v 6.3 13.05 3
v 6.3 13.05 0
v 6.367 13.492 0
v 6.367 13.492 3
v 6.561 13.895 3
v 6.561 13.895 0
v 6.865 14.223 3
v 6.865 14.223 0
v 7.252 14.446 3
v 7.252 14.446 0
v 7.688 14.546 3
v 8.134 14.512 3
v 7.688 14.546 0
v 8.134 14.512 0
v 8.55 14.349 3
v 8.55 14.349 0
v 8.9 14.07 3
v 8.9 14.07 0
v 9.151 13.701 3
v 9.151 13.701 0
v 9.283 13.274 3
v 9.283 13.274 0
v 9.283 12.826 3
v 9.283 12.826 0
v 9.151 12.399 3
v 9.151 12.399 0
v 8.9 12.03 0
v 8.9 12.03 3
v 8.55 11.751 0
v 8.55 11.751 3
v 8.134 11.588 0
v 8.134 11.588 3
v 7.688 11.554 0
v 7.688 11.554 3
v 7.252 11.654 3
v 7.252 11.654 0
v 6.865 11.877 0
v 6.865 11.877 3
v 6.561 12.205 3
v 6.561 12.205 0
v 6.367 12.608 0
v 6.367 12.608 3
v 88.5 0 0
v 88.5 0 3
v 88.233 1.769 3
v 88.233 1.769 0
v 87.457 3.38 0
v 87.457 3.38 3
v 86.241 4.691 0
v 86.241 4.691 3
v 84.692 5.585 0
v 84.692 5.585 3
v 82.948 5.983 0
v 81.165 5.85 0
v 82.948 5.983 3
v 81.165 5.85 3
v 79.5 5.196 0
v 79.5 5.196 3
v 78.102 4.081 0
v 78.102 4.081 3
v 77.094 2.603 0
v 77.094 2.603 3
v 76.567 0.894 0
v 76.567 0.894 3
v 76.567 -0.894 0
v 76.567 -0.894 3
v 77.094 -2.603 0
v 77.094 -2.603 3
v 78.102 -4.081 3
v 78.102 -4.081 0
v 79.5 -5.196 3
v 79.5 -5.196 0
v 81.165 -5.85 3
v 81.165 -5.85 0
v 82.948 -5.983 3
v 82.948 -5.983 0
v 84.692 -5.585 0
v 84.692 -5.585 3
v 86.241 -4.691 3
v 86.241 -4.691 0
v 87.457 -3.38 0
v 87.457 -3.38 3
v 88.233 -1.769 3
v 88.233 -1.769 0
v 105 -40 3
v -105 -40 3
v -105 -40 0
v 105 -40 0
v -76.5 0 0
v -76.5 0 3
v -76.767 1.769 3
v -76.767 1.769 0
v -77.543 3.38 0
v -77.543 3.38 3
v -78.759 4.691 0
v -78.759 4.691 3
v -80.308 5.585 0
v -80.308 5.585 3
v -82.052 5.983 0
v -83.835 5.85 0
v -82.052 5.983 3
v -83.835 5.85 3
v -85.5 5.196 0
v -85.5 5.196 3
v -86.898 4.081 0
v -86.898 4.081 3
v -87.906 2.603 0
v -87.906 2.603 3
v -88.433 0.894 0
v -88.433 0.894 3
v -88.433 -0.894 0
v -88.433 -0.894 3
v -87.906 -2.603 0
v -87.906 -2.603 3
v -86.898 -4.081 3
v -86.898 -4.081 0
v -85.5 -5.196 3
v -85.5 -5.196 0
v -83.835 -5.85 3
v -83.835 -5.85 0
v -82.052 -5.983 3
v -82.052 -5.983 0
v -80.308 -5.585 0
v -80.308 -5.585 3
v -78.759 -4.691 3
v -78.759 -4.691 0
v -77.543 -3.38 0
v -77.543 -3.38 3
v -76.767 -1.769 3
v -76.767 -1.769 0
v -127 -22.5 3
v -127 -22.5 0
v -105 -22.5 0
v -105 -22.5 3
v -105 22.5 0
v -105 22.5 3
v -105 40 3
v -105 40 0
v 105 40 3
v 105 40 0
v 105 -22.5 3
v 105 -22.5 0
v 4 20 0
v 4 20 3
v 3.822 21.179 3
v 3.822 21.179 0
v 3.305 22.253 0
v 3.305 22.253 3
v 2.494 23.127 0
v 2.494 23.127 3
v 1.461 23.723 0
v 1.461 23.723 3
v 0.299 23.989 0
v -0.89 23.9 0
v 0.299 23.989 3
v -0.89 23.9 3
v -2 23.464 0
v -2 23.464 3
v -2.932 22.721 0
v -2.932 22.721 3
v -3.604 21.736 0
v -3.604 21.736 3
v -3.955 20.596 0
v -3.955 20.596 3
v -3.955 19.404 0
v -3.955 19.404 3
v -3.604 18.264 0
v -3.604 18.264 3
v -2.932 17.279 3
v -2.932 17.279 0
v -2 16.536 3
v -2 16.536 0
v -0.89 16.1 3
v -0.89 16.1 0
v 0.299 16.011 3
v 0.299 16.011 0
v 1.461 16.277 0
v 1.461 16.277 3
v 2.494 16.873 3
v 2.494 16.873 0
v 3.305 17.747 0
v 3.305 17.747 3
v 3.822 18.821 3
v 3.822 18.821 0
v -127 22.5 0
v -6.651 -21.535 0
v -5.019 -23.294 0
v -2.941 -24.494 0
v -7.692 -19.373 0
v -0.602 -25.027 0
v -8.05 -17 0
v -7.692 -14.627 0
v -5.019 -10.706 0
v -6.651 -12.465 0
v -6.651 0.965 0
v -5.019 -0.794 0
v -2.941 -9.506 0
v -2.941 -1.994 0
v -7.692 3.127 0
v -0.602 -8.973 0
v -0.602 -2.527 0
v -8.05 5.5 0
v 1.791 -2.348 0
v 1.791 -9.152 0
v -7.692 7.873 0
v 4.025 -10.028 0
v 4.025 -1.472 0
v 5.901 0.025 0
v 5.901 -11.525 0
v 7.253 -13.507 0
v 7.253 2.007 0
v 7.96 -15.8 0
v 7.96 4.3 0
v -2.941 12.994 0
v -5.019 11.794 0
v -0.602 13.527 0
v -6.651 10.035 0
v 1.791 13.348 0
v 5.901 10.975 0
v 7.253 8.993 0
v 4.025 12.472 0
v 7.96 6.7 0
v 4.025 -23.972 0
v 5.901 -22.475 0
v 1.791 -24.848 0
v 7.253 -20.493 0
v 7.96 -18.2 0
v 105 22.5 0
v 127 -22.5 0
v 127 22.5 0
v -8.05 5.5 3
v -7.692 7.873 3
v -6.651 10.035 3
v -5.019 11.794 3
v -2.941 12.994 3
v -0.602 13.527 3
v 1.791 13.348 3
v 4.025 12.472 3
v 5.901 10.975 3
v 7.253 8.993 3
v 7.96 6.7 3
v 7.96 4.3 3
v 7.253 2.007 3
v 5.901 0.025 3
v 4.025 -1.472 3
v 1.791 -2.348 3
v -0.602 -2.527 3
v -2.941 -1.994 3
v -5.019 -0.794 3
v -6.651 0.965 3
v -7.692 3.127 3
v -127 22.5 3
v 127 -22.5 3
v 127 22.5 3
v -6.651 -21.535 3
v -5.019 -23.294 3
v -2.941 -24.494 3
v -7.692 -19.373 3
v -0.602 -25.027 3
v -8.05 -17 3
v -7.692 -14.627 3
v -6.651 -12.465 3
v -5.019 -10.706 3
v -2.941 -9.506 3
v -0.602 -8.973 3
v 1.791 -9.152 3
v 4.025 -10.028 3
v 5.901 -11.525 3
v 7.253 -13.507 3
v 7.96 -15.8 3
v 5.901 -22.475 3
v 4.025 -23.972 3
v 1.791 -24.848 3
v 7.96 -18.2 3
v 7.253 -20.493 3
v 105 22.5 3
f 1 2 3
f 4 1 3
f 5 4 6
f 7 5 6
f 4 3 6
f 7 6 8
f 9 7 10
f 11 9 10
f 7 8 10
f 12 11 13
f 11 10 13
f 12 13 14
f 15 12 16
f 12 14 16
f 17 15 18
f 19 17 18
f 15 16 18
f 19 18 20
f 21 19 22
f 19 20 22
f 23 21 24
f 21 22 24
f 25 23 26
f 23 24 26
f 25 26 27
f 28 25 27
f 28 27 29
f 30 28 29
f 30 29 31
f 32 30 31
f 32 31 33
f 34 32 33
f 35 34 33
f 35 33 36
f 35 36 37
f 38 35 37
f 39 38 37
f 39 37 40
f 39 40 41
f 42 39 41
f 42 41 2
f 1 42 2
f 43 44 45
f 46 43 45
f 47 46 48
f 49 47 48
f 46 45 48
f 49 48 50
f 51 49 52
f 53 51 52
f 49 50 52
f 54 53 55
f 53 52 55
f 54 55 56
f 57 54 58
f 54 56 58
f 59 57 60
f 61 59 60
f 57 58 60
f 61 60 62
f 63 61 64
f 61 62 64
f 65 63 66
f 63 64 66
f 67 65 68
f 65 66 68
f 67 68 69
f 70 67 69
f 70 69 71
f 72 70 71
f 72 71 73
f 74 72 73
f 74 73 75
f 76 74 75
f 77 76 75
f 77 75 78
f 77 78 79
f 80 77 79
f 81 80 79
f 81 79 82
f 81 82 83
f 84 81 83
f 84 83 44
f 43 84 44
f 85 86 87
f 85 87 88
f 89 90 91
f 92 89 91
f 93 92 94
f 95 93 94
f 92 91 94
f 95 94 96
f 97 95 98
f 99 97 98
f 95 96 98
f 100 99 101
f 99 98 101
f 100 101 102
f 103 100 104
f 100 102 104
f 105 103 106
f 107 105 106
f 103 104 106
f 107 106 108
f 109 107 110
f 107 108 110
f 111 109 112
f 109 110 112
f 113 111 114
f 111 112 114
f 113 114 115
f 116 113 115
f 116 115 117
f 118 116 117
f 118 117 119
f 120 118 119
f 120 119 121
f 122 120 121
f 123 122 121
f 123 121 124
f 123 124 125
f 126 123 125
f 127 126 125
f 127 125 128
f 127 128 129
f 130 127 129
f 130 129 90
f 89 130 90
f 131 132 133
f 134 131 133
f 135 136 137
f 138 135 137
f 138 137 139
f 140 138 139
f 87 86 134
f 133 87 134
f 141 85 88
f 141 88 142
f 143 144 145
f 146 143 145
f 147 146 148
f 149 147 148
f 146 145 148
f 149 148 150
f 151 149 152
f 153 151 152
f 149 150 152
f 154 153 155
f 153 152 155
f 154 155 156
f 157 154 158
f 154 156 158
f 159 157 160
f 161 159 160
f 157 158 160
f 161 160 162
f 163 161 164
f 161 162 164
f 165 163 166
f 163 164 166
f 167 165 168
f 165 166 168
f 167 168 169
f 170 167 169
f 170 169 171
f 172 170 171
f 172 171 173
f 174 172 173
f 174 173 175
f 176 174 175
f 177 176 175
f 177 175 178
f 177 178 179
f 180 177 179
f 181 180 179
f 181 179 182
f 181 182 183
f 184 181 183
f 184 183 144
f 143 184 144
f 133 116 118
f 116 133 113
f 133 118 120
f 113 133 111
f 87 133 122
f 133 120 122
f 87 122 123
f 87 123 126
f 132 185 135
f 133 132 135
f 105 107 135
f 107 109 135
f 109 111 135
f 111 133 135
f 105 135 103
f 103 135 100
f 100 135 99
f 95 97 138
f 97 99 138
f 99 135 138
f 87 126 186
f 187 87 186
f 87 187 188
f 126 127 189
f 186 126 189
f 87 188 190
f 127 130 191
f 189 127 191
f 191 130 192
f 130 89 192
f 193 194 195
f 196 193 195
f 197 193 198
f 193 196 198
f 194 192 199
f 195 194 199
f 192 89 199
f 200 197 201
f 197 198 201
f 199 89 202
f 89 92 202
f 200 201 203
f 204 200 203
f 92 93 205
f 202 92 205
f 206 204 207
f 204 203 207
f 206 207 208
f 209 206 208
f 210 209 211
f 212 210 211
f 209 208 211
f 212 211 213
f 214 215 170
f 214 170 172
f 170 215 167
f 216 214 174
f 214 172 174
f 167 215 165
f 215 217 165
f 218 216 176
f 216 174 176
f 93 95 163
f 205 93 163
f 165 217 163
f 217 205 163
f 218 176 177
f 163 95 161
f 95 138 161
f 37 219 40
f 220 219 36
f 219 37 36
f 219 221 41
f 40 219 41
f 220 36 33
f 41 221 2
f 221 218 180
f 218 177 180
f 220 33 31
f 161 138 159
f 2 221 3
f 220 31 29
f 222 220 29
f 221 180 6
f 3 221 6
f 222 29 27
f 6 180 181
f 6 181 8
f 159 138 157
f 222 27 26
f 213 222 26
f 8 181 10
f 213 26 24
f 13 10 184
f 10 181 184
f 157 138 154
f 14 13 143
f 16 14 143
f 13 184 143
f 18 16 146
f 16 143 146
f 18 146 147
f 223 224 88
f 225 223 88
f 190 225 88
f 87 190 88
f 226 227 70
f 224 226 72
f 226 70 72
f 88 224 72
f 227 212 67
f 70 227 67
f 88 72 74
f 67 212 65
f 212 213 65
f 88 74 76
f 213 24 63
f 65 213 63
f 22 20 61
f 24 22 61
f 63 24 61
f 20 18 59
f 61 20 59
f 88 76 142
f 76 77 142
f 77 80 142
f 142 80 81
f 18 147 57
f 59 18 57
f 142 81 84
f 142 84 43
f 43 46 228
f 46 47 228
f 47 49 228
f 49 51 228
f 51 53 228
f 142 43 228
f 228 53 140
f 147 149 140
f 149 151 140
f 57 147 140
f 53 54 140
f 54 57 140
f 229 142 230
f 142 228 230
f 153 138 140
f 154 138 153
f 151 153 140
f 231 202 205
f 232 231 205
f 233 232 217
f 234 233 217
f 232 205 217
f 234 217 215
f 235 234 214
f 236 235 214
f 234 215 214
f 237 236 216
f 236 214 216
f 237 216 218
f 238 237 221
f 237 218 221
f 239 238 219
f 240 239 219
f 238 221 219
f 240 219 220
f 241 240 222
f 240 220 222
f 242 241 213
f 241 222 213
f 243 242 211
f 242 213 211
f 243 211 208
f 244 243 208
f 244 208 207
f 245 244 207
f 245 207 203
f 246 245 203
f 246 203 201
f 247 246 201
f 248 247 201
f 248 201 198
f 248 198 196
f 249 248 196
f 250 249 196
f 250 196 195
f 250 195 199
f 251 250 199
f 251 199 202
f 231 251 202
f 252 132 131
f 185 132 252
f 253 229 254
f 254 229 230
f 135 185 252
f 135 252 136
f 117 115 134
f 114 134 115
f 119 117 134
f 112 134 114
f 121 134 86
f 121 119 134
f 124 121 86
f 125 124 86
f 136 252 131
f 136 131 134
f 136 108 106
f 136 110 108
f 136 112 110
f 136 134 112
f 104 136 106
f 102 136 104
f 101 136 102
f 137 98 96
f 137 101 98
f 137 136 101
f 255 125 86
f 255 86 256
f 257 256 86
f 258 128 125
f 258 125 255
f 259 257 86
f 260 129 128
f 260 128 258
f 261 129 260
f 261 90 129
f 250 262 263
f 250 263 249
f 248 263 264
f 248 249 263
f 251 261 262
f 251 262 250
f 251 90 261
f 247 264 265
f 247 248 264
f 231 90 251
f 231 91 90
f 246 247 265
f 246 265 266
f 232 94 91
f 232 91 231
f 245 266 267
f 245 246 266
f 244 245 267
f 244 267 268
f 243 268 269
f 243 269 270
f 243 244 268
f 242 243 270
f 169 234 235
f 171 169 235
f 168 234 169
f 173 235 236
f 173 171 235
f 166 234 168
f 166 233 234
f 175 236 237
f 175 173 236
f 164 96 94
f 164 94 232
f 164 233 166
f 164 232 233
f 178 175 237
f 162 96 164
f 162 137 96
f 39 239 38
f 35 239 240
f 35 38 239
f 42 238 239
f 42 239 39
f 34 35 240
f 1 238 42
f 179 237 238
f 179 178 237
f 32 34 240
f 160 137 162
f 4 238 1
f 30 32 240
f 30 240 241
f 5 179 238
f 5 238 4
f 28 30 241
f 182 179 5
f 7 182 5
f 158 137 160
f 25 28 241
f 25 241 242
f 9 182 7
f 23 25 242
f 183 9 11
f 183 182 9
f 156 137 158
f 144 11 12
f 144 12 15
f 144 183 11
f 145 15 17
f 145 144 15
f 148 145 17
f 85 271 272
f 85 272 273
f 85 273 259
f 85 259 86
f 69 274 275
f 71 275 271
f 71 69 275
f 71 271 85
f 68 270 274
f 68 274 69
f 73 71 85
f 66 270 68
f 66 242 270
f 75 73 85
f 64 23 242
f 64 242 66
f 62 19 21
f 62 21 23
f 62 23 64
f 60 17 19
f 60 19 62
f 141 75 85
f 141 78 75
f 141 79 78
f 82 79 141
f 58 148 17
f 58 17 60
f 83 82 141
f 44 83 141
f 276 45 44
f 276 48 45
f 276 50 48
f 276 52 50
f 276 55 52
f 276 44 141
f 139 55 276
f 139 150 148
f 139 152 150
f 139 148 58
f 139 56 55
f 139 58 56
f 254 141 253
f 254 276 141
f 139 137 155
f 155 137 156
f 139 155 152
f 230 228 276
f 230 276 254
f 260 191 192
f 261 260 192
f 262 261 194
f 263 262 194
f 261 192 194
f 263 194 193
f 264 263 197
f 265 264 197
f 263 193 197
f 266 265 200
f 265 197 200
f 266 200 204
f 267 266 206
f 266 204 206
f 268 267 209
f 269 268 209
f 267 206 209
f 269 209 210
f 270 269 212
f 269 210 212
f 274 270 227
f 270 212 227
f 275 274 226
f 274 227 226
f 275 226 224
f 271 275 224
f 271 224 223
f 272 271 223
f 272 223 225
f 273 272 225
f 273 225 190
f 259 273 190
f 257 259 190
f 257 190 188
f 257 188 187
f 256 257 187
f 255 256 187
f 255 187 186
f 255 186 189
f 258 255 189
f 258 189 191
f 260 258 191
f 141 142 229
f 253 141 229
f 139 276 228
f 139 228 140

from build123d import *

# Parameters (mm, degrees)
CROQUIS1_W              = 22
CROQUIS1_H              = 45
CROQUIS1_W_2            = 210
CROQUIS1_H_2            = 60
SALIENTE_EXTRUIR1_DEPTH = 3
CORTAR_EXTRUIR1_REACH   = 5
CROQUIS2_R              = 6
CORTAR_EXTRUIR2_REACH   = 5
CROQUIS3_R              = 4
CROQUIS4_W              = 210
CROQUIS4_H              = 10
SALIENTE_EXTRUIR2_DEPTH = 3
CROQUIS5_W              = 210
CROQUIS5_H              = 10
SALIENTE_EXTRUIR3_DEPTH = 3
CROQUIS6_R              = 1.5
CROQUIS6_R_2            = 8.05
CORTAR_EXTRUIR3_DEPTH   = 7


with BuildPart() as part:
    # Croquis1 → Saliente-Extruir1 (new body)
    with BuildSketch(Plane.XY):
        with Locations((-116, 0)):
            Rectangle(CROQUIS1_W, CROQUIS1_H)
        Rectangle(CROQUIS1_W_2, CROQUIS1_H_2)
        with Locations((116, 0)):
            Rectangle(CROQUIS1_W, CROQUIS1_H)
    extrude(amount=SALIENTE_EXTRUIR1_DEPTH)

    # Croquis2 → Cortar-Extruir1 (cut, up to next)
    with BuildSketch(Plane.XY.offset(3), mode=Mode.PRIVATE) as cortar_extruir1_sk1:
        with Locations((82.5, 0)):
            Circle(CROQUIS2_R)
    cortar_extruir1_tool1 = extrude(cortar_extruir1_sk1.sketch, amount=-CORTAR_EXTRUIR1_REACH, mode=Mode.PRIVATE) & part.part
    add(cortar_extruir1_tool1.solids().sort_by_distance((82.5, 0, 3))[0], mode=Mode.SUBTRACT)
    # Croquis2 → Cortar-Extruir1 (cut, up to next)
    with BuildSketch(Plane.XY.offset(3), mode=Mode.PRIVATE) as cortar_extruir1_sk2:
        with Locations((-82.5, 0)):
            Circle(CROQUIS2_R)
    cortar_extruir1_tool2 = extrude(cortar_extruir1_sk2.sketch, amount=-CORTAR_EXTRUIR1_REACH, mode=Mode.PRIVATE) & part.part
    add(cortar_extruir1_tool2.solids().sort_by_distance((-82.5, 0, 3))[0], mode=Mode.SUBTRACT)

    # Croquis3 → Cortar-Extruir2 (cut, up to next)
    with BuildSketch(Plane.XY.offset(3), mode=Mode.PRIVATE) as cortar_extruir2_sk1:
        with Locations((0, 20)):
            Circle(CROQUIS3_R)
    cortar_extruir2_tool1 = extrude(cortar_extruir2_sk1.sketch, amount=-CORTAR_EXTRUIR2_REACH, mode=Mode.PRIVATE) & part.part
    add(cortar_extruir2_tool1.solids().sort_by_distance((0, 20, 3))[0], mode=Mode.SUBTRACT)

    # Croquis4 → Saliente-Extruir2 (add)
    with BuildSketch(Plane.XY.offset(3)):
        with Locations((0, -35)):
            Rectangle(CROQUIS4_W, CROQUIS4_H)
    extrude(amount=-SALIENTE_EXTRUIR2_DEPTH)

    # Croquis5 → Saliente-Extruir3 (add)
    with BuildSketch(Plane.XY.offset(3)):
        with Locations((0, 35)):
            Rectangle(CROQUIS5_W, CROQUIS5_H)
    extrude(amount=-SALIENTE_EXTRUIR3_DEPTH)

    # Croquis6 → Cortar-Extruir3 (cut)
    with BuildSketch(Plane(origin=(0, 0, 0), x_dir=(-1, 0, 0), z_dir=(0, 0, -1))):
        with Locations((-7.8, 13.05)):
            Circle(CROQUIS6_R)
        with Locations((0, 5.5)):
            Circle(CROQUIS6_R_2)
        with Locations((0, -17)):
            Circle(CROQUIS6_R_2)
    extrude(amount=-CORTAR_EXTRUIR3_DEPTH, mode=Mode.SUBTRACT)


solid = part.part
